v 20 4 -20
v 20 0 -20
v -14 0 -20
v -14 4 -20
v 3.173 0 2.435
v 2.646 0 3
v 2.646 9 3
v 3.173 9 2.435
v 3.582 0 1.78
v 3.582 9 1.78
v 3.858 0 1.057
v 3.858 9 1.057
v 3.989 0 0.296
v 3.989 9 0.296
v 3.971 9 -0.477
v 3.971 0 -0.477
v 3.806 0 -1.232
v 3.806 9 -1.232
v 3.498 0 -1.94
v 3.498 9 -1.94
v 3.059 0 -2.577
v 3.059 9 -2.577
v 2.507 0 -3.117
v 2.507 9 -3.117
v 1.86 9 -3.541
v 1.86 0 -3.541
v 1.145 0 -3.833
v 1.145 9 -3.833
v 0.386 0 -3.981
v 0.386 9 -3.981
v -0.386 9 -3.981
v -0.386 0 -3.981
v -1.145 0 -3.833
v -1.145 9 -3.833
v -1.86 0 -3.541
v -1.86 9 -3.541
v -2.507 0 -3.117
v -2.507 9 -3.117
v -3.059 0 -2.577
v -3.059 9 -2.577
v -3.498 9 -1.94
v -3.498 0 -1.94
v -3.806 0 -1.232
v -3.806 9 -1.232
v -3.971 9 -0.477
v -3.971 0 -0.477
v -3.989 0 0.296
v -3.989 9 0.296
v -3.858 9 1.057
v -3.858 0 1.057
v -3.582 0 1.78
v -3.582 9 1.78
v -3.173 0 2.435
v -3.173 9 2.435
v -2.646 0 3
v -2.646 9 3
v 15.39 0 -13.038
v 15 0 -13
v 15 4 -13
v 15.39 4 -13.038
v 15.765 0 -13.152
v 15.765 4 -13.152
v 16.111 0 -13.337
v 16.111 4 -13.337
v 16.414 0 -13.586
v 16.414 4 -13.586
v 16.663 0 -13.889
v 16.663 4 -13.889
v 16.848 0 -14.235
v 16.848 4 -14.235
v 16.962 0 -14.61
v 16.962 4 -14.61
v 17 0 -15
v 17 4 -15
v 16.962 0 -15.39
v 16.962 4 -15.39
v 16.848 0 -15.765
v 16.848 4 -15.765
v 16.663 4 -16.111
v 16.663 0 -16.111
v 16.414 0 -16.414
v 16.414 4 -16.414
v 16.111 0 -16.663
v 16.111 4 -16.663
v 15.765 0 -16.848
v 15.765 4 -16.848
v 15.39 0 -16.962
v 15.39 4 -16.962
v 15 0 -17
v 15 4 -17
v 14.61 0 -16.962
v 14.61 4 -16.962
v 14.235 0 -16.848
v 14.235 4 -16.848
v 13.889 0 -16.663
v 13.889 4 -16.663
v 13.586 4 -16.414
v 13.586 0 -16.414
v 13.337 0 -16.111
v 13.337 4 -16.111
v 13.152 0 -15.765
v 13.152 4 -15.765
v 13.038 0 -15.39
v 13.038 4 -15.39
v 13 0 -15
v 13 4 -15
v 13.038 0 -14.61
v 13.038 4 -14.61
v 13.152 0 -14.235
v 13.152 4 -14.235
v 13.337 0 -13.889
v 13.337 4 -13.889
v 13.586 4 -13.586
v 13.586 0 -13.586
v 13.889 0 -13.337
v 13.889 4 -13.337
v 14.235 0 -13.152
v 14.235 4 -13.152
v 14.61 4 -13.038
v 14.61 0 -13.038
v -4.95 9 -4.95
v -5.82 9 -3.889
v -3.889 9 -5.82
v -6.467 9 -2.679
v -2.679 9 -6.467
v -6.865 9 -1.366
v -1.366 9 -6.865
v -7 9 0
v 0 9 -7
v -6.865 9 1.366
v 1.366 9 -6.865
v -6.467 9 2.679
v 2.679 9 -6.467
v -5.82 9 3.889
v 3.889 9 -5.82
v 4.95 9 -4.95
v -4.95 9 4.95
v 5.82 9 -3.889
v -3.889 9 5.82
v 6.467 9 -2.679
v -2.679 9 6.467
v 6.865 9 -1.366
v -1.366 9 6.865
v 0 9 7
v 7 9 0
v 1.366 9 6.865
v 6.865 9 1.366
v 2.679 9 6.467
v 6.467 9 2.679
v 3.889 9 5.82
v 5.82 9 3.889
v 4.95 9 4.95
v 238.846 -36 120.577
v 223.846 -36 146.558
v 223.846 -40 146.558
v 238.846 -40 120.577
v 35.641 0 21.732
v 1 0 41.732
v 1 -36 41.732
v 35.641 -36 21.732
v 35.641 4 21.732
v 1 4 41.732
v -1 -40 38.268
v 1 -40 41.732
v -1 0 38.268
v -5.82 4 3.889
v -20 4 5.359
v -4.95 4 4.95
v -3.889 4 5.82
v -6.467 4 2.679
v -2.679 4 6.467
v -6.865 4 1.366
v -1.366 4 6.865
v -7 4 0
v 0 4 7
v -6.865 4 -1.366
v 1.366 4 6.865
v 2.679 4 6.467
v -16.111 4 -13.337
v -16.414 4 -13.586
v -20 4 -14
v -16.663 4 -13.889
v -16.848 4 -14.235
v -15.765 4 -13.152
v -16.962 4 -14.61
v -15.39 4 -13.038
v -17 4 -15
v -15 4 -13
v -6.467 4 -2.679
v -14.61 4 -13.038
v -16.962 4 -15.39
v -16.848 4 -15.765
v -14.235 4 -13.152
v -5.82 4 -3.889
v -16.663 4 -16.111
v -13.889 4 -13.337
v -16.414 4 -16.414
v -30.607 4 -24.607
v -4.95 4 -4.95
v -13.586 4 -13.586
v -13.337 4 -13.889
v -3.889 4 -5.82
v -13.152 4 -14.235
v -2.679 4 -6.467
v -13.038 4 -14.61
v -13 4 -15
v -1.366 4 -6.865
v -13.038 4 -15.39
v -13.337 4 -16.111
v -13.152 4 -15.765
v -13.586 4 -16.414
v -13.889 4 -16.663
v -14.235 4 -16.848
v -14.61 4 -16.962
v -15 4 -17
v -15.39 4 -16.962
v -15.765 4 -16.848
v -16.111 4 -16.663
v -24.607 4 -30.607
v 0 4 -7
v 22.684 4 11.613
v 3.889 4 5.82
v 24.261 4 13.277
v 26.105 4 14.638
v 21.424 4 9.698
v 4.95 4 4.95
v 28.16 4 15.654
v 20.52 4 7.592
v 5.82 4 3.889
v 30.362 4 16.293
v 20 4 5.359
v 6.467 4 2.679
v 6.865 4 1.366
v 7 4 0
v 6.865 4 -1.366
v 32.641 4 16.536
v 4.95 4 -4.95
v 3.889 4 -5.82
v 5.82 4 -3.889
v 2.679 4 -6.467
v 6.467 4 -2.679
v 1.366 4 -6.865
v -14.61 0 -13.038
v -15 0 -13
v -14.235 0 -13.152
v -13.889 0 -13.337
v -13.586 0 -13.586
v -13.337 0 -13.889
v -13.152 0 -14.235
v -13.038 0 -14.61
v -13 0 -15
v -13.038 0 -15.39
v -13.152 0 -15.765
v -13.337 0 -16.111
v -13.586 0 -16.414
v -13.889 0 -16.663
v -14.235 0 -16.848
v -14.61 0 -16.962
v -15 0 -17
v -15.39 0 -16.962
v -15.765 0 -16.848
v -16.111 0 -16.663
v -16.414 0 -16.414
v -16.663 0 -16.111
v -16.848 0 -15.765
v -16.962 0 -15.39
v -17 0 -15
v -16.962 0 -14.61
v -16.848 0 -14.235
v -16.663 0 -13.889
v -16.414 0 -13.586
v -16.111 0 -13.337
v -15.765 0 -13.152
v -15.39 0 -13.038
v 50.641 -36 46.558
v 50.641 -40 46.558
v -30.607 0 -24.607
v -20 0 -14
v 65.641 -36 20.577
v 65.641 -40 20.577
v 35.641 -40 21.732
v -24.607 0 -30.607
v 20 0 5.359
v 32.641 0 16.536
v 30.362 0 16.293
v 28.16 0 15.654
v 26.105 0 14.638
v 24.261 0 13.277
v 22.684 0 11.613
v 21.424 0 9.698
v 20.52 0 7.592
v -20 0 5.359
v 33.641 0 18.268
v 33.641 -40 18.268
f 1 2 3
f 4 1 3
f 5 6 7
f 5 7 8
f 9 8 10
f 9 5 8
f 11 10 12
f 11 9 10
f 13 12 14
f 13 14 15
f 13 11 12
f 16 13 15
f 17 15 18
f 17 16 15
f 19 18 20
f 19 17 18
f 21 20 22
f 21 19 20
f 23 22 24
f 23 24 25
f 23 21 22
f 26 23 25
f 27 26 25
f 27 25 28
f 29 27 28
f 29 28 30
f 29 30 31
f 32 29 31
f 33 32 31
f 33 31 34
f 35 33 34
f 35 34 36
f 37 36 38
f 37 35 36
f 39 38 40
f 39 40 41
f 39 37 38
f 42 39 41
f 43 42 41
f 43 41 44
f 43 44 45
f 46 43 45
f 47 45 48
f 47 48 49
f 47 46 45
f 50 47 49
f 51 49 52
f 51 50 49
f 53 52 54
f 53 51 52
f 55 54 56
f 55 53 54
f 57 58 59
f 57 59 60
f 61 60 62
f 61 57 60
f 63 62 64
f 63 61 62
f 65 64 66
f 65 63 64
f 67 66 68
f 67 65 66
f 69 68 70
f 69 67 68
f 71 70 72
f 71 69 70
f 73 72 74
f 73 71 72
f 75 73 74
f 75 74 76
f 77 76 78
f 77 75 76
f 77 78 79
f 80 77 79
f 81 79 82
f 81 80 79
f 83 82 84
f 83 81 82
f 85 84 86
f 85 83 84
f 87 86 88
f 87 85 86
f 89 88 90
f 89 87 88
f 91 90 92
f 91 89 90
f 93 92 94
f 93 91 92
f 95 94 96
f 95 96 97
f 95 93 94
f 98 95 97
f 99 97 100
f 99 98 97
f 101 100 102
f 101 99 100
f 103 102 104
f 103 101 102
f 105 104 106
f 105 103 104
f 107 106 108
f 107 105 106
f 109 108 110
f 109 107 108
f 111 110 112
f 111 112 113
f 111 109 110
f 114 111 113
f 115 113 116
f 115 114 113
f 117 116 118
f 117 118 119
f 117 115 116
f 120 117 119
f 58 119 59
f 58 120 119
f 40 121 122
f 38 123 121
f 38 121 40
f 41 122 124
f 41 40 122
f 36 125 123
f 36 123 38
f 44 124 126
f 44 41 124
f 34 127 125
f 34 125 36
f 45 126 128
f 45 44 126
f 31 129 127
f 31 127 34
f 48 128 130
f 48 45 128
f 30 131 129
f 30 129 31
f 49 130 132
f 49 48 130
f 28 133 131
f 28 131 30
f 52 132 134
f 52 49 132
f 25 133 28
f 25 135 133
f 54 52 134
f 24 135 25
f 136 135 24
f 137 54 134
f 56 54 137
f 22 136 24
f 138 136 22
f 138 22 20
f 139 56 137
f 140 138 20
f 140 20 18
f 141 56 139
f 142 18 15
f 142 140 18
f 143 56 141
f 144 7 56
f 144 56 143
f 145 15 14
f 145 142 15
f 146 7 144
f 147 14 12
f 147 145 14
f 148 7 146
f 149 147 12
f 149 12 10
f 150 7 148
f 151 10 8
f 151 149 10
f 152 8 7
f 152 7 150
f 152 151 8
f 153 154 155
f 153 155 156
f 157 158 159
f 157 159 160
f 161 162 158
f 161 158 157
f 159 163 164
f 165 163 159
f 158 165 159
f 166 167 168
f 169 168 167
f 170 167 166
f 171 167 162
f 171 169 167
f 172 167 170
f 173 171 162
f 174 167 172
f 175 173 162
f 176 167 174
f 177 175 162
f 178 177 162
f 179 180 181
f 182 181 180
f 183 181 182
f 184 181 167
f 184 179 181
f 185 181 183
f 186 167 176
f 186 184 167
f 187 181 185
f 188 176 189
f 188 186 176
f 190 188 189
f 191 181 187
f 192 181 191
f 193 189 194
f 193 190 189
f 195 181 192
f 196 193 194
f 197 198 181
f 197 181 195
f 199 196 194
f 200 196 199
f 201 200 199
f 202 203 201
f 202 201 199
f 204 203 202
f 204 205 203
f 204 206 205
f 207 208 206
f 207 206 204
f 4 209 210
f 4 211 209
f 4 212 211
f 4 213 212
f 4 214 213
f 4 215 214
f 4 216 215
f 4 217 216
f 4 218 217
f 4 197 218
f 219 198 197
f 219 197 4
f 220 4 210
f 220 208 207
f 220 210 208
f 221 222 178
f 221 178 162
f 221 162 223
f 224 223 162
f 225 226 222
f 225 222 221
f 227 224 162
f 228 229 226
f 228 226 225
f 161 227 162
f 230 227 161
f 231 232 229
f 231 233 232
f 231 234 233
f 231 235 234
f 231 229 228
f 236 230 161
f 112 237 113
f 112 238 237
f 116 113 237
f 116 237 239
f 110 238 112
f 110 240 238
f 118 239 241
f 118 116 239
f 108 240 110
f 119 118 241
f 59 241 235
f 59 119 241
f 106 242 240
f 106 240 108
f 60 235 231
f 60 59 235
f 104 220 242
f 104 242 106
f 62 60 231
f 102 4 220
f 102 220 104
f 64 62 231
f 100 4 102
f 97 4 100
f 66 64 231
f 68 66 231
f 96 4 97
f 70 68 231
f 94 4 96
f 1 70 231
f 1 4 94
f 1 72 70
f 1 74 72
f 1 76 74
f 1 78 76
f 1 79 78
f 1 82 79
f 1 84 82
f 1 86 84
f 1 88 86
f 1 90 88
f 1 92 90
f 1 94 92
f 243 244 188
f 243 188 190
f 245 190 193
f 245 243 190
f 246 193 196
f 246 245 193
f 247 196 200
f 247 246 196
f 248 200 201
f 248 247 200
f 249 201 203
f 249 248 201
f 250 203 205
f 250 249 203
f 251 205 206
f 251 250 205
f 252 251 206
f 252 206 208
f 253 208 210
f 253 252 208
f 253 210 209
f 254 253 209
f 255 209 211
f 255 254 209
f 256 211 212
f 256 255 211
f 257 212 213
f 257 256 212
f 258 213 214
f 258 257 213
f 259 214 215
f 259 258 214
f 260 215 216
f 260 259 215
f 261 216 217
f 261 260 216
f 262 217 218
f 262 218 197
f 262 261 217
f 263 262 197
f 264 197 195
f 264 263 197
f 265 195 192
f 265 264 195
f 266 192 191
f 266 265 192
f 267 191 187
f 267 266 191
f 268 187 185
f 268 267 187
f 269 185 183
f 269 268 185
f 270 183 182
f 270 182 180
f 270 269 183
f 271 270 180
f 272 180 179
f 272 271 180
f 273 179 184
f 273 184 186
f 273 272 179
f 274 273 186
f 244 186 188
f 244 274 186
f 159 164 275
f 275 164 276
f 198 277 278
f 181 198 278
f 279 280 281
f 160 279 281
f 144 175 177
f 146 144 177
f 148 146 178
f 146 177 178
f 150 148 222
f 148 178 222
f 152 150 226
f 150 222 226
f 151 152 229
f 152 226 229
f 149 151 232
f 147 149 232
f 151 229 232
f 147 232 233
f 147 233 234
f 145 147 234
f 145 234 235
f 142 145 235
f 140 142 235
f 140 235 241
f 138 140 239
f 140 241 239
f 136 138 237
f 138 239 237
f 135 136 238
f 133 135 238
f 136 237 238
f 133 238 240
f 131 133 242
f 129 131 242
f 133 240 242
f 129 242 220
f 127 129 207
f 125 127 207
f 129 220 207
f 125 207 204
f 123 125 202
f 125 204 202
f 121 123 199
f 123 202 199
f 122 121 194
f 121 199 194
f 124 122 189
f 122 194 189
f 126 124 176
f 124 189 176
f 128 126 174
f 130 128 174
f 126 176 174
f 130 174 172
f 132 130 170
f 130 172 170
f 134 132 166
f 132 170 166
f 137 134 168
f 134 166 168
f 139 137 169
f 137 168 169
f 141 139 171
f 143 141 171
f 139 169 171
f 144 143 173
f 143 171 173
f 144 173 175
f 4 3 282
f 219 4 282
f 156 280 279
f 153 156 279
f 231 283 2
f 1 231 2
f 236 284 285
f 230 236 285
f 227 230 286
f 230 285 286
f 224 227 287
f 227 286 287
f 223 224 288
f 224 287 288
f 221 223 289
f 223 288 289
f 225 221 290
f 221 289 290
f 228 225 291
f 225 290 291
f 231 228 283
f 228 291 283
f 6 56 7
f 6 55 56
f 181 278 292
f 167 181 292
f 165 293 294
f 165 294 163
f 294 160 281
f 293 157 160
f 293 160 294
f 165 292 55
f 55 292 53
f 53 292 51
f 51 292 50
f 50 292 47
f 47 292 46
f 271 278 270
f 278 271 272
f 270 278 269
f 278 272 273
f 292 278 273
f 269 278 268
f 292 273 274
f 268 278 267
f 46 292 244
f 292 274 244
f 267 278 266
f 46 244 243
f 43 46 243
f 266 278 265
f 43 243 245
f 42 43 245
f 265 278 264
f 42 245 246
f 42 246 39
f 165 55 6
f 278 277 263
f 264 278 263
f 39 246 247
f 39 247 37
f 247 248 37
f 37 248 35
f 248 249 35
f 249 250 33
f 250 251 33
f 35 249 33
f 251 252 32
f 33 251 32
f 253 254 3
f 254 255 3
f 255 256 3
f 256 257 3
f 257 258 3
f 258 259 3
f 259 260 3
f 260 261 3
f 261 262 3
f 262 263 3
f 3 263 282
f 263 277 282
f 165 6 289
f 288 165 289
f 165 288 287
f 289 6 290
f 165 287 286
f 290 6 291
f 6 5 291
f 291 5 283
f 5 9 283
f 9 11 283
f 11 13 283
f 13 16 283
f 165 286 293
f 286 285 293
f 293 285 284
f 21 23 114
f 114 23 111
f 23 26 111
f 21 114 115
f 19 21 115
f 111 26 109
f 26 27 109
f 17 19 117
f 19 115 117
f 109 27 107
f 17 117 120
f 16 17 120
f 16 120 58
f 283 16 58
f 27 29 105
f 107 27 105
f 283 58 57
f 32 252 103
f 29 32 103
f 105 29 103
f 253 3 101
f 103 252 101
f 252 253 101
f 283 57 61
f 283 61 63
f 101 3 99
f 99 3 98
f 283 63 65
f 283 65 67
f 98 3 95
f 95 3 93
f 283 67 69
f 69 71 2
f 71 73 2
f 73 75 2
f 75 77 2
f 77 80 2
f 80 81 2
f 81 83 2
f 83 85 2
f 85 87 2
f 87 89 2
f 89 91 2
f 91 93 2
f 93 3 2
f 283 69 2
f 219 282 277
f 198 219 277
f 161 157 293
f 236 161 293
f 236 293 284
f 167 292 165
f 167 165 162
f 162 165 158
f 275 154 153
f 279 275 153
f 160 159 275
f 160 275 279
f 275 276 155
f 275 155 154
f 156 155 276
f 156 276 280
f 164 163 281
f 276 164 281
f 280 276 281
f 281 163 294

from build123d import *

# Parameters (mm, degrees)
SKETCH1_R           = 2
BOSS_EXTRUDE1_DEPTH = 4
SKETCH2_R           = 7
BOSS_EXTRUDE2_DEPTH = 5
BOSS_EXTRUDE6_DEPTH = 40
BOSS_EXTRUDE7_DEPTH = 4
SKETCH9_W           = 30
SKETCH9_H           = 4
BOSS_EXTRUDE8_DEPTH = 200


with BuildPart() as part:
    # Sketch1 → Boss-Extrude1 (new body)
    with BuildSketch(Plane(origin=(0, 0, 0), x_dir=(1, 0, 0), z_dir=(0, 1, 0))):
        with BuildLine():
            Line((1, -41.732050808), (35.641016151, -21.732050808))
            Line((35.641016151, -21.732050808), (32.641016151, -16.535898385))
            ThreePointArc((32.641016151, -16.535898385), (24.260749779, -13.277014078), (20, -5.358983849))
            Line((20, -5.358983849), (20, 20))
            Line((20, 20), (-14, 20))
            Line((-14, 20), (-24.606601718, 30.606601718))
            Line((-24.606601718, 30.606601718), (-30.606601718, 24.606601718))
            Line((-30.606601718, 24.606601718), (-20, 14))
            Line((-20, 14), (-20, -5.358983849))
            Line((-20, -5.358983849), (1, -41.732050808))
        make_face()
        with Locations(Location((-15, 15, 0), (0, 0, 270))):
            Circle(SKETCH1_R, mode=Mode.SUBTRACT)
        with Locations(Location((15, 15, 0), (0, 0, 270))):
            Circle(SKETCH1_R, mode=Mode.SUBTRACT)
        with BuildLine():
            Line((-2.645751311, -3), (2.645751311, -3))
            ThreePointArc((2.645751311, -3), (0, 4), (-2.645751311, -3))
        make_face(mode=Mode.SUBTRACT)
    extrude(amount=BOSS_EXTRUDE1_DEPTH)

    # Sketch2 → Boss-Extrude2 (add)
    with BuildSketch(Plane(origin=(0, 4, 0), x_dir=(1, 0, 0), z_dir=(0, 1, 0))):
        with Locations(Location((0, 0, 0), (0, 0, 270))):
            Circle(SKETCH2_R)
        with BuildLine():
            Line((-2.645751311, -3), (2.645751311, -3))
            ThreePointArc((2.645751311, -3), (0, 4), (-2.645751311, -3))
        make_face(mode=Mode.SUBTRACT)
    extrude(amount=BOSS_EXTRUDE2_DEPTH)

    # Sketch7 → Boss-Extrude6 (add)
    with BuildSketch(Plane.XZ):
        Polygon((1, 41.732050808), (35.641016151, 21.732050808), (33.641016151, 18.267949192), (-1, 38.267949192), align=None)
    extrude(amount=BOSS_EXTRUDE6_DEPTH)

    # Sketch8 → Boss-Extrude7 (add)
    with BuildSketch(Plane.XZ.offset(40)):
        Polygon((50.641016151, 46.558112383), (65.641016151, 20.577350269), (35.641016151, 21.732050808), (1, 41.732050808), align=None)
    extrude(amount=-BOSS_EXTRUDE7_DEPTH)

    # Sketch9 → Boss-Extrude8 (add)
    with BuildSketch(Plane(origin=(58.141016151, 0, 33.567731326), x_dir=(0.5000000000000051, 0, -0.8660254037844357), z_dir=(0.8660254037844357, 0, 0.5000000000000051))):
        with Locations((0, -38)):
            Rectangle(SKETCH9_W, SKETCH9_H)
    extrude(amount=BOSS_EXTRUDE8_DEPTH)


solid = part.part
